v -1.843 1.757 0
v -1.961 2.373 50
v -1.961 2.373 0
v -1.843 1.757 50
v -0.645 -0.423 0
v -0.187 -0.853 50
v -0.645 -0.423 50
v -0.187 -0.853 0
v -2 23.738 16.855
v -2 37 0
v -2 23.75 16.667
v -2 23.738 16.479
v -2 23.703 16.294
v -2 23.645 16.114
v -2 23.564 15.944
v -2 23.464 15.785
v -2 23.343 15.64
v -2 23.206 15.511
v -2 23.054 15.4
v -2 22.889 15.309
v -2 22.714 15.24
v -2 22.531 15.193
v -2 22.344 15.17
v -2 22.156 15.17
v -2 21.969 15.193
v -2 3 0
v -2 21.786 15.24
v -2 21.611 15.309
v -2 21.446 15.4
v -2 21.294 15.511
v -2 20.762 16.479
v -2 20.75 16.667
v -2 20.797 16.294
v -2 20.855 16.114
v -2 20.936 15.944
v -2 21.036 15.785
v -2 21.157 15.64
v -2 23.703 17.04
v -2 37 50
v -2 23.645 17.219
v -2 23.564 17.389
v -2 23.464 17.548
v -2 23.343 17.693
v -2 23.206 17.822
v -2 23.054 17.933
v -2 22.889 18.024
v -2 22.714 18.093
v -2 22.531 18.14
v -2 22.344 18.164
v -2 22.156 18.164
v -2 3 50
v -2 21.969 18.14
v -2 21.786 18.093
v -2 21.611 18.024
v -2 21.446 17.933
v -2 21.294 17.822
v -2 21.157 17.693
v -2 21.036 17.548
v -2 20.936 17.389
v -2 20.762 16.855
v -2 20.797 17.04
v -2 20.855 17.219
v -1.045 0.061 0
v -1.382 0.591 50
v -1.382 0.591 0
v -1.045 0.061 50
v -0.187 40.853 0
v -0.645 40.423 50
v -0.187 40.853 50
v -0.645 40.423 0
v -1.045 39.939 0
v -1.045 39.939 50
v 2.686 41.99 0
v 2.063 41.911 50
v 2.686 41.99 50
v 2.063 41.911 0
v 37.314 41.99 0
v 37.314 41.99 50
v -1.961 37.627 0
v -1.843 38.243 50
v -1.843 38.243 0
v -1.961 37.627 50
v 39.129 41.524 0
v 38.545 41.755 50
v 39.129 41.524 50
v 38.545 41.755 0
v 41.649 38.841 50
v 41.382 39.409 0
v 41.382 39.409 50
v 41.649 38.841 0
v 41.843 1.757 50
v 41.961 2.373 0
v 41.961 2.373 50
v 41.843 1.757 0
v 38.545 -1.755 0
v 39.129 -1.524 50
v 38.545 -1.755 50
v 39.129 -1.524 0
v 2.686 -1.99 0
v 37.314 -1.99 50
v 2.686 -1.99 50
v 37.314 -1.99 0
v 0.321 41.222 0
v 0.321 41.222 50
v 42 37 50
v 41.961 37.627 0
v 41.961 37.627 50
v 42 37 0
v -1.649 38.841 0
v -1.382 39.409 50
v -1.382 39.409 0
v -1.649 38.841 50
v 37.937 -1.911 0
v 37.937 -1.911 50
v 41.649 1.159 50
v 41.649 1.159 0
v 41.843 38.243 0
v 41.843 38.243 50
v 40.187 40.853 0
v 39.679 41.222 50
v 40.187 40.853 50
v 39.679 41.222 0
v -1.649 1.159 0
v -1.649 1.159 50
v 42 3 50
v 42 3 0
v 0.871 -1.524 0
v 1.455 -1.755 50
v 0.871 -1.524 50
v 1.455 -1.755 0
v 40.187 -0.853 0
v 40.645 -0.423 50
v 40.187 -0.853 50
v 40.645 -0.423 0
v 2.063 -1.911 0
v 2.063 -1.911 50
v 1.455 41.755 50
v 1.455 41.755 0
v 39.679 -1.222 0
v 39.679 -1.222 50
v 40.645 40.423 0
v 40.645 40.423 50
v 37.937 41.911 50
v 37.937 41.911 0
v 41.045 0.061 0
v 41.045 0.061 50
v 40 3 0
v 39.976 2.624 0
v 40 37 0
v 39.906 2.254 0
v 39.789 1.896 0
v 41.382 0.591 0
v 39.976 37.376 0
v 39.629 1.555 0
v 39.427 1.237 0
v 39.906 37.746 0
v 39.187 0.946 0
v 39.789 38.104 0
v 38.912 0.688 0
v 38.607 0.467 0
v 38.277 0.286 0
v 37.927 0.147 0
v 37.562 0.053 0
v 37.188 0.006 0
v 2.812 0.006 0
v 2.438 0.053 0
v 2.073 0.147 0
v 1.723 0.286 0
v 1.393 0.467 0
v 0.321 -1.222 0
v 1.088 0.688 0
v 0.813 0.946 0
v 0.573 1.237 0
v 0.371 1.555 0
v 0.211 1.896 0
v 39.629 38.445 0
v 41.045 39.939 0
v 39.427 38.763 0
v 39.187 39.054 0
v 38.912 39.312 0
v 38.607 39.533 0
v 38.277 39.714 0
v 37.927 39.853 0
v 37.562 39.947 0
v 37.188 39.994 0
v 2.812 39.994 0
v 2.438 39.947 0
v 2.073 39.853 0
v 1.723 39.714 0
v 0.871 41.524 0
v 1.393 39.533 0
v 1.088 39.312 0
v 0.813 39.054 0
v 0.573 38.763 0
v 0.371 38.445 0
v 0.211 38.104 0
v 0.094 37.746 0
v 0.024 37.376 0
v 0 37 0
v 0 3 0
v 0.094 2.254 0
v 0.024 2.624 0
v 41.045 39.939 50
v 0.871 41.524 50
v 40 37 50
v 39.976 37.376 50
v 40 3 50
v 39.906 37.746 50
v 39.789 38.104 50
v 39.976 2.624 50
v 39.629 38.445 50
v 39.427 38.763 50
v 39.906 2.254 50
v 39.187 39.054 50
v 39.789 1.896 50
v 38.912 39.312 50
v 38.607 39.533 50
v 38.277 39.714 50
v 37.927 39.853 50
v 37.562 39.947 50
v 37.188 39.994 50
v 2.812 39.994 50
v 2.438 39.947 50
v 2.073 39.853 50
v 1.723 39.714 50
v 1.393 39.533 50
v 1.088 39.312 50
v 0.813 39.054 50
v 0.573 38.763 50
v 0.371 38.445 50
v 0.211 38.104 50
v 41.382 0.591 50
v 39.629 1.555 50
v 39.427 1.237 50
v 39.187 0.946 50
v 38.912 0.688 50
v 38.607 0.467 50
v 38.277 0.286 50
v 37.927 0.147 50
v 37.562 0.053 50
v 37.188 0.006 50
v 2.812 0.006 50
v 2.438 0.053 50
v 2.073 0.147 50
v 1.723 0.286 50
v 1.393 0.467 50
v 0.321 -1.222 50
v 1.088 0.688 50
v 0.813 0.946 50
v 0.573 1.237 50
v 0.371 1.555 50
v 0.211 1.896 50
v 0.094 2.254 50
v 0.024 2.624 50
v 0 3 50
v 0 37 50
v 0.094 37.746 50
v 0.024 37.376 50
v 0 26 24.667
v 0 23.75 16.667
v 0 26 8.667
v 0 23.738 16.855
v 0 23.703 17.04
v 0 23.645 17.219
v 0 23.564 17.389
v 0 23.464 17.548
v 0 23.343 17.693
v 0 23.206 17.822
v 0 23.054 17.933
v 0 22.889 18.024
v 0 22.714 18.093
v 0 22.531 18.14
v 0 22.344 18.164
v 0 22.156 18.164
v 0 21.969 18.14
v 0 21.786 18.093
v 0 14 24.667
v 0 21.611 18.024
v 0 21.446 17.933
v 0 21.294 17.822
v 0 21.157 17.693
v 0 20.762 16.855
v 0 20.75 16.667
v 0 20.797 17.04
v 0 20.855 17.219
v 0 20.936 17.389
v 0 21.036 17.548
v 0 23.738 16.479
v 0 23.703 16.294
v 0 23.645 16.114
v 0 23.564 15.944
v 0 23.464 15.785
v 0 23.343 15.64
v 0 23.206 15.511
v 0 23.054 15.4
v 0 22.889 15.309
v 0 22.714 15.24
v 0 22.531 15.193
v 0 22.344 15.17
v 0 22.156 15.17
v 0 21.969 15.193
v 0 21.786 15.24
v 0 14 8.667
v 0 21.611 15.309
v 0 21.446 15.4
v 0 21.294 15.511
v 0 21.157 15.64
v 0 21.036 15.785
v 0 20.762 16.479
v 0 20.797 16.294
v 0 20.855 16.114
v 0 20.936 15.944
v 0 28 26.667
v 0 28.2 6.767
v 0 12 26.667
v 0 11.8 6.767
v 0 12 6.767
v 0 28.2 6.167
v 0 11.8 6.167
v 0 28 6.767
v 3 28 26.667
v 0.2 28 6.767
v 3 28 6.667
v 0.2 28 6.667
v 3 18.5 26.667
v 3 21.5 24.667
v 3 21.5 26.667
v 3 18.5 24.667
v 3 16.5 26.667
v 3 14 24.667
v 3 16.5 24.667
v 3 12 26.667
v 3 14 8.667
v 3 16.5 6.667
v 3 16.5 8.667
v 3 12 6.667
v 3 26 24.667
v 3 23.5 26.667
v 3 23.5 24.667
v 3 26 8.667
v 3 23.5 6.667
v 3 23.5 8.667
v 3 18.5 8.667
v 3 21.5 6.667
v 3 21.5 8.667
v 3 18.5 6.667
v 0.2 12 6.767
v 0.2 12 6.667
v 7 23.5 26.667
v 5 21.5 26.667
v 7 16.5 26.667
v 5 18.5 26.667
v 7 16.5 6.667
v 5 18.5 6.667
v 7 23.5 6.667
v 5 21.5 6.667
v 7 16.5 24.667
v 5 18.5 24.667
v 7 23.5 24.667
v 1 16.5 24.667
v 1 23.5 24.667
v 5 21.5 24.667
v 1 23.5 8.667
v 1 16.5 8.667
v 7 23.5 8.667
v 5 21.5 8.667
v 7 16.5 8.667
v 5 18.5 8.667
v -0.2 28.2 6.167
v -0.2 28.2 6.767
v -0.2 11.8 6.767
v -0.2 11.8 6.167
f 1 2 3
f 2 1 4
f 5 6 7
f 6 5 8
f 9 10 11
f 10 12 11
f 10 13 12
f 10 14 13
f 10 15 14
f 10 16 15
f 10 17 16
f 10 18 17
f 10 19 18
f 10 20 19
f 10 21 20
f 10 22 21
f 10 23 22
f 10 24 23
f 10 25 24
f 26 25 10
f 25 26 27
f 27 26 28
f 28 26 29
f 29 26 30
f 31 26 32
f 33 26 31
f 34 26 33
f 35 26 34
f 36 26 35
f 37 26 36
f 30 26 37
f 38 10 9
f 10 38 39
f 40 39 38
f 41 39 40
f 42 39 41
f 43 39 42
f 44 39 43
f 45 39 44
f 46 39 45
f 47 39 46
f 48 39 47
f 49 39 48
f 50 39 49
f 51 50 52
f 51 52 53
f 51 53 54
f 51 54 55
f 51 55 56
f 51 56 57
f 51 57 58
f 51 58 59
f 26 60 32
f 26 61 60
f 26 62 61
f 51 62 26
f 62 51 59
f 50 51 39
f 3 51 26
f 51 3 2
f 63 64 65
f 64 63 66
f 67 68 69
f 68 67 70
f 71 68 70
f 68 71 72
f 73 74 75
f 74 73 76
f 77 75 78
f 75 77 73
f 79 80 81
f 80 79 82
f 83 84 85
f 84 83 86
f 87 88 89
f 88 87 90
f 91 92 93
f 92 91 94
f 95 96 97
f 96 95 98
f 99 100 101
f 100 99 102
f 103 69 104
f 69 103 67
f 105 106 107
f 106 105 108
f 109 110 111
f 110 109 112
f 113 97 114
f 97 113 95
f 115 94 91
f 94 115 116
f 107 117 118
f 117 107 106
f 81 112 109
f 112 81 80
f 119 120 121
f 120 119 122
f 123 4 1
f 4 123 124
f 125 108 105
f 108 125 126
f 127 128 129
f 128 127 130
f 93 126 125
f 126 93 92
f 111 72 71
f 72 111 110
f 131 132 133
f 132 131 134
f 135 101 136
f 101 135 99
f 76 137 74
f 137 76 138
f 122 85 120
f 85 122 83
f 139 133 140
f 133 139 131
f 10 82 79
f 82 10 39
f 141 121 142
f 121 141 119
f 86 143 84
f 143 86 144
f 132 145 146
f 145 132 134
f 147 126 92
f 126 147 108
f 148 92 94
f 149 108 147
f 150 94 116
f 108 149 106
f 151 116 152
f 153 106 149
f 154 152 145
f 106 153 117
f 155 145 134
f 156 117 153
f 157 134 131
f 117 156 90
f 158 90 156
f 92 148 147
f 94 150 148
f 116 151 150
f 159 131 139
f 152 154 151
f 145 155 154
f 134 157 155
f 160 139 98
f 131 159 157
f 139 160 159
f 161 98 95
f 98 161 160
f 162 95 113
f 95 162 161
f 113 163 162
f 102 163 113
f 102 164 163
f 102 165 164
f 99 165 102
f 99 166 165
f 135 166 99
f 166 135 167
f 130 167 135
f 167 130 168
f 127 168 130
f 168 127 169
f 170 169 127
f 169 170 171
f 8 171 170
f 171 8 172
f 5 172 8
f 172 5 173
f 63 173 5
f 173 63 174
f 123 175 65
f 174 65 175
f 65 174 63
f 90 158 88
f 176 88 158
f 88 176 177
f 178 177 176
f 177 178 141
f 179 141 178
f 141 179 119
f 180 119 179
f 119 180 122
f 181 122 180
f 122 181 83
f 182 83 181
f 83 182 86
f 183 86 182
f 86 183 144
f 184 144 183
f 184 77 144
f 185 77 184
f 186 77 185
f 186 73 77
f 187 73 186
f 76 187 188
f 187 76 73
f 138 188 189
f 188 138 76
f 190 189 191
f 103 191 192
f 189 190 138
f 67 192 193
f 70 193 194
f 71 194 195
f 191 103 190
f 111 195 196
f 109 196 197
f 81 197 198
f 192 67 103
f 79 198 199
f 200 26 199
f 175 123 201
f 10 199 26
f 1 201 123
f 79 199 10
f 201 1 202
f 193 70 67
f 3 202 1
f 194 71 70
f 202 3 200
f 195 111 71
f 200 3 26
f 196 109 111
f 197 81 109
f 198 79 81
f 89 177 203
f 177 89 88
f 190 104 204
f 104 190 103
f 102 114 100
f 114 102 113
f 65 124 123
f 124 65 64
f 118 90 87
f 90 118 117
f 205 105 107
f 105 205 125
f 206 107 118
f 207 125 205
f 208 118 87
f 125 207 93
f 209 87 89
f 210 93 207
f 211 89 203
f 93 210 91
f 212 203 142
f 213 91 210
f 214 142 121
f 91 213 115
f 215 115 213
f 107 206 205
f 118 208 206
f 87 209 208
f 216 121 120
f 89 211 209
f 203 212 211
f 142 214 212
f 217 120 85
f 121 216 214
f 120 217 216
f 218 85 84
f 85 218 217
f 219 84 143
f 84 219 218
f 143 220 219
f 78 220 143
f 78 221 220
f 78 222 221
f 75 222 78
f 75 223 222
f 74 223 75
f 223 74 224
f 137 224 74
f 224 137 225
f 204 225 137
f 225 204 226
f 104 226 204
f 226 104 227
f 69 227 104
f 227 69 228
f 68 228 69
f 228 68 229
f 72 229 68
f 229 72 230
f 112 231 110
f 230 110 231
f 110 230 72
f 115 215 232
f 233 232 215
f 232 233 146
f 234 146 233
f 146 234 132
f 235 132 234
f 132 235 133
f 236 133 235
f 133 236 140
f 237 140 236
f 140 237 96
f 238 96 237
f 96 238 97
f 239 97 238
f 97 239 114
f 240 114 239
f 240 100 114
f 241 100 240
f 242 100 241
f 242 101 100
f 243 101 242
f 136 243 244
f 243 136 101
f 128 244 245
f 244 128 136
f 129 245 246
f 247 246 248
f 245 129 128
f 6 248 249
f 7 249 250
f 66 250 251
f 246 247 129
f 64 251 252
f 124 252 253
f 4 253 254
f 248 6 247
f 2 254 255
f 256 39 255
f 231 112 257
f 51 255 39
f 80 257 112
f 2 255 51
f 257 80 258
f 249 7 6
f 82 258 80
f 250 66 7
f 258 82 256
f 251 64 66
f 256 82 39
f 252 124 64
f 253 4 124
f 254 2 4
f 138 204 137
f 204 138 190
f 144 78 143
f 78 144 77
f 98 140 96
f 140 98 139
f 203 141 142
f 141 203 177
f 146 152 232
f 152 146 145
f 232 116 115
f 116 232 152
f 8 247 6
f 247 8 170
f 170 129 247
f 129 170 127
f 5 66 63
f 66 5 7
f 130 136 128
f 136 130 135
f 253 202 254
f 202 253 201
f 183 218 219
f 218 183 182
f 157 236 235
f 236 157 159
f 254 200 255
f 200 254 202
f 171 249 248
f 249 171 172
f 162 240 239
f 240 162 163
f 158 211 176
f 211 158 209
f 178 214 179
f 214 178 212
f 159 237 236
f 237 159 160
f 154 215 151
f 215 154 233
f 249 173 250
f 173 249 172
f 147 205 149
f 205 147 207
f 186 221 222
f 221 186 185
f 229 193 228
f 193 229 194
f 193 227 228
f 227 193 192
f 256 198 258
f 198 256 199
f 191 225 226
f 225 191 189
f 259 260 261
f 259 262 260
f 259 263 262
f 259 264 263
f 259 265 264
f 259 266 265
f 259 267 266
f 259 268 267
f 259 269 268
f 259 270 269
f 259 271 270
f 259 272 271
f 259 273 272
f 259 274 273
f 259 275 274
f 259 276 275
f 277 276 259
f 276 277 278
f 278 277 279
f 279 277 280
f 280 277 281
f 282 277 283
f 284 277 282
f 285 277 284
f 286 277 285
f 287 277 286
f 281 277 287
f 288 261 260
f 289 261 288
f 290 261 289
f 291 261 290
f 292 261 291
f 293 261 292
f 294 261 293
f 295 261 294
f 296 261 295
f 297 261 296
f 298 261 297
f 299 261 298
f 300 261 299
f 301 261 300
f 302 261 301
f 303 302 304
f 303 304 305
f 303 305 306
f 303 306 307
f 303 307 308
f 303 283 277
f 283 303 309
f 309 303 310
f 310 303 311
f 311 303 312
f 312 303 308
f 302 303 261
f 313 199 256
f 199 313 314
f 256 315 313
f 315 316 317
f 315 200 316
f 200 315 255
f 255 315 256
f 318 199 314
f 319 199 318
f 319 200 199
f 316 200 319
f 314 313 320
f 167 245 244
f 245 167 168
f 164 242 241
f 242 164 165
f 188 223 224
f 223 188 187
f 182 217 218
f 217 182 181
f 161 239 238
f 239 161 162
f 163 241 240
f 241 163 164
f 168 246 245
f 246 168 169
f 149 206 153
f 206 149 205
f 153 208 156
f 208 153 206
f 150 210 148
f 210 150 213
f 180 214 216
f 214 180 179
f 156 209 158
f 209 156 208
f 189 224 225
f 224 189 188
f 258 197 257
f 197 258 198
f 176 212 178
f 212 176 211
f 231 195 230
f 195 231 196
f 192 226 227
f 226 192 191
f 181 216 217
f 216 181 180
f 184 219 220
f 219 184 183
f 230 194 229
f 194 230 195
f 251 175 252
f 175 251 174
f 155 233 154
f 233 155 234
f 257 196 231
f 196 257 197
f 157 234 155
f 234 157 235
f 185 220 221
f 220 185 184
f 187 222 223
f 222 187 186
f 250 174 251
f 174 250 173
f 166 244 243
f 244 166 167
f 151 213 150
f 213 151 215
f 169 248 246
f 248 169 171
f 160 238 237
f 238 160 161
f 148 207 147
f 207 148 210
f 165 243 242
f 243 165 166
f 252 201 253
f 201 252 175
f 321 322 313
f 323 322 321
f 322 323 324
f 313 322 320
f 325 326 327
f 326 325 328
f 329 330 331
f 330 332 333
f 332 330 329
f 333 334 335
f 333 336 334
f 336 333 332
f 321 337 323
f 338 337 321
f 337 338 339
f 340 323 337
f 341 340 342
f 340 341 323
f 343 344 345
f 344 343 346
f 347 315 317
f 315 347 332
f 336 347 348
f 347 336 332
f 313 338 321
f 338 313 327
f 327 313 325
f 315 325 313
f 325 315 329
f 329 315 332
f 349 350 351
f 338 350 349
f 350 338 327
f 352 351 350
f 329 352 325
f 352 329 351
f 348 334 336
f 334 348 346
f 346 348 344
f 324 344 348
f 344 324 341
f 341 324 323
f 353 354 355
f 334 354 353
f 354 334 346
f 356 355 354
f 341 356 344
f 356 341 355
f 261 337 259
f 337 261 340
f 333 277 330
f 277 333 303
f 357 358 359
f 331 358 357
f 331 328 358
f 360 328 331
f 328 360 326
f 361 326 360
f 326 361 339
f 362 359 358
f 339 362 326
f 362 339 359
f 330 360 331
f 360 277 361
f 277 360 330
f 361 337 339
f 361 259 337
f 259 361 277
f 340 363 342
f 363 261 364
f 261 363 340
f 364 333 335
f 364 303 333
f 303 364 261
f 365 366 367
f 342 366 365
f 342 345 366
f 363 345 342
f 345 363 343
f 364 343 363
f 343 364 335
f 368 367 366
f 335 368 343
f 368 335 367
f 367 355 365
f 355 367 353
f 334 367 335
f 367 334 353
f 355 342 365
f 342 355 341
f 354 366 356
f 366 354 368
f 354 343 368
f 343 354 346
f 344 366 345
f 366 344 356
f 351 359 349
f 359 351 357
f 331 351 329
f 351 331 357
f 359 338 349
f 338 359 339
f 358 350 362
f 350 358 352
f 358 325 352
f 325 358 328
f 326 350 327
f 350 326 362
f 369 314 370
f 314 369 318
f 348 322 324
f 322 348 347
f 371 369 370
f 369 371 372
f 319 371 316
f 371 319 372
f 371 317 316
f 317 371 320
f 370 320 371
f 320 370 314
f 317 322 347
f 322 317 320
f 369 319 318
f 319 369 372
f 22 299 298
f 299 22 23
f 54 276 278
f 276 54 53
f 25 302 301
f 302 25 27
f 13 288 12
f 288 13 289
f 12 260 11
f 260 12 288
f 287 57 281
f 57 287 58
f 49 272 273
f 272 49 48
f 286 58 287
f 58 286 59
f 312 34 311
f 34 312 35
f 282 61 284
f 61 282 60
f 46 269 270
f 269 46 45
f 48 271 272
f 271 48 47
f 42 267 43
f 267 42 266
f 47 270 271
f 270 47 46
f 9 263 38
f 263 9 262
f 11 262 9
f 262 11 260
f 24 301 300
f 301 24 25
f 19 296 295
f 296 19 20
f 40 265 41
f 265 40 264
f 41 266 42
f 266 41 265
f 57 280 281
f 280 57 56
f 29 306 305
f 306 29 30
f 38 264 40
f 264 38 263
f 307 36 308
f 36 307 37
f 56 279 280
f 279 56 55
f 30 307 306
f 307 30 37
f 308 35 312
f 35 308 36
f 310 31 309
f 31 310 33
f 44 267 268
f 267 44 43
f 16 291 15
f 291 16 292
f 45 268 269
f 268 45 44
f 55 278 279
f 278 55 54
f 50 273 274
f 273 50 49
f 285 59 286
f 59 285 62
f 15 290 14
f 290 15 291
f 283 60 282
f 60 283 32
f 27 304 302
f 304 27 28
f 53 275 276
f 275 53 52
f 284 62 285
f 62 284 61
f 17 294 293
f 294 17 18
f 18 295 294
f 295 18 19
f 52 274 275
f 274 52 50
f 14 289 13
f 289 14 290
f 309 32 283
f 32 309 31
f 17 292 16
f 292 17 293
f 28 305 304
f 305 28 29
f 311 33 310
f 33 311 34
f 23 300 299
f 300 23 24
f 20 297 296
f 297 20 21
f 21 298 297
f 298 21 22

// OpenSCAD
// file: ../src/components.scad
tiny = 0.01; // Value to add hole depths to fully clear OpenSCAD preview.

module doppler_motion_sensor() {
    translate([0, 0, 0]) tap_post(6, 1.4);
    translate([15, 0, 0]) tap_post(6, 1.4);
    translate([0, 15, 0]) tap_post(6, 1.4);
    translate([15, 15, 0]) tap_post(6, 1.4);
}

module round_buzzer(buzzer_d, hole_d) {
    difference() {
        linear_extrude(2) circle((buzzer_d+2)/2.0);
        translate([0,0,-tiny]) linear_extrude(2+2*tiny) circle(buzzer_d/2.0);
    }
}

module round_buzzer_hole(hole_d) {
    hole(hole_d/2.0);
}

// Works best if r is evenly divisible by hole_w
module circular_speaker_grid_holes(r, h=wall, hole_w=2) {
    tiny = 0.01;
    translate([0, 0, -(h/2)-tiny]) intersection() {
        union() {
            for (y = [-(r-hole_w):2*hole_w:r-hole_w]) {
                translate([0, y, 0]) cube([r*2, hole_w, h+2*tiny], center=true);
            }
        }
        cylinder(r=r, h=h+2*tiny, center=true);
    }
}

module bme280() {
    translate([0, 0, 3/2]) difference() {
        cube([12+4, 16+4, 3], center=true);
        cube([12, 16, 3+2*tiny], center=true);
    }
    translate([3.5, -8-2, 1]) rotate([0, 0, 90]) wire_tie_loop();
    translate([3.5, 8, 1]) rotate([0, 0, 90]) wire_tie_loop();
}

module bme280_marker() {
    small = 0.2;
    translate([0, -(((16+4)/2)+small), 0])
        cube([12+4+2*small, small*3, small*2], center=true);
}

module bme280_hole() {
    translate([(11.5/2)-3.5, 0, -tiny]) hole(3/2);
}

module max9814_mic(rot=0) {
    rotate([0, 0, rot])
        union() {
            difference() {
                translate([-7.5-2, -7.5-2, 0]) cube([15.5+4, 26.5+4, 6]);
                translate([-7.5, -7.5, -tiny]) cube([15.5, 26.5, 6+2*tiny]);
            }
            translate([-7.5-2, -7.5-2, 0]) cube([15.5+4, 26.5, 3]);
            translate([8, 5, 4]) rotate([0, 0, 0]) wire_tie_loop();
            translate([-9.5, 5, 4]) rotate([0, 0, 0]) wire_tie_loop();
        }
}

module max9814_mic_hole() {
    translate([0, 0, 6-tiny]) hole(5, wall+6);
}

module wire_tie_loop() {
    translate([1,3.5,3]) difference() {
        cube([2, 7, 6], center=true);
        cube([2+2*tiny, 3, 2], center=true);
    }
}
// file: ../src/utils.scad
module tap_post(h, size, post_wall=2) {
    inner_d = size*0.8; //Possibly snug, but with PLA I prefer that
    outer_d = post_wall*2+size;
    difference() {
        linear_extrude(h) circle(outer_d/2.0);
        translate([0, 0, -1]) linear_extrude(h+2) circle(inner_d/2.0); 
    }
}

module heat_insert_post(h, size, post_wall=2) {
    inner_d = size;
    outer_d = post_wall*2+size;
    inset_r = (size+2+0.15)/2.0;
    chamfer_h = sin(8)*inset_r;
    difference() {
        linear_extrude(h) circle(outer_d/2.0);
        translate([0, 0, -1]) linear_extrude(h+2) circle(inner_d/2.0);
        translate([0, 0, -1]) cylinder(h=h+2, r1=inset_r, r2=inset_r-cos(8)*inset_r); 
    }
}

module horizontal_slot_hole(sw, sh) {
    translate([-(sw-sh)/2.0, 0, 0]) hole(sh/2.0, wall);
    centered_rect_hole(sw-sh, sh, wall);
    translate([(sw-sh)/2.0, 0, 0]) hole(sh/2.0, wall);
}

module tapered_bolt_hole(r, h) {
    rotate([180, 0, 0]) translate([0, 0, -1]) union() {
        bolt_top_r = r*2;
        chamfer_h = sin(45)*bolt_top_r;
        h_chamfered = chamfer_h>h?h:chamfer_h;
        h_remaining = chamfer_h>h?0:h-chamfer_h;
        cylinder(h=1, r=bolt_top_r);
        translate([0, 0, 1])
            cylinder(h=h_chamfered, r1=bolt_top_r, r2=r);
        translate([0, 0, h_chamfered])
            cylinder(h=h_remaining+2, r=r*0.80);
    }
}

module hole(r, h=wall) {
        rotate([180, 0, 0]) translate([0, 0, -1]) linear_extrude(h+2) circle(r);
}

module centered_rect_hole(w, d, h) {
    rotate([180, 0, 0]) translate([0, 0, -1]) linear_extrude(h+2) square([w,d], center=true);
}

module round_rect(dim, radius) {
    hull() {
        translate([radius, radius, 0]) circle(radius);
        translate([dim.x-radius, radius, 0]) circle(radius);
        translate([radius, dim.y-radius, 0]) circle(radius);
        translate([dim.x-radius, dim.y-radius, 0]) circle(radius);
    }
}

module left(x, y) {
    translate([0, x, y]) rotate([-90, 180, -90]) children();
}

module right(x, y) {
    translate([w, d-x, y]) rotate([-90, 180, 90]) children();
}

module front(x, y) {
    translate([w-x, 0, y]) rotate([90, 0, 180]) children();
}

module back(x, y) {
    translate([x, d, y]) rotate([90, 0, 0]) children();
}

module bottom(x, y) {
    translate([x, y, 0]) children();
}
// file: ../src/simple_box.scad
/* You must define these in your project file.
$fn = 50;
w = 100; // Inner box width (X)
d = 70; // Inner box depth (Y)
h = 40; // Inner box height (Z)

// Wall should be at least 2 or it may not print well.
wall = 2; // Box/lid wall thickness
// Fillet must be greater than or equal to 2*wall.
fillet = 7; // Fillet radius of xy plane fillet

lid_inset = 0.5; // So lid is not such a tight fit.
lid_hole_size = 3; // M3 bolt.
 */
 
//include <../src/utils.scad>; // For debugging
//simple_box_lid(); // For debugging

module simple_box() {
    _make_simple_box_bottom();
    translate([0, 0, wall]) simple_box_body();
}

module _make_simple_box_bottom() {
	translate([-wall, -wall, -wall]) 
        linear_extrude(wall)
			round_rect([w+2*wall,d+2*wall], fillet);
}

module simple_box_bottom() {
    _make_simple_box_bottom();
    difference() {
        translate([lid_inset, lid_inset, 0])
            linear_extrude(2*wall+2)
                round_rect([w-2*lid_inset,d-2*lid_inset], fillet-wall-lid_inset);
        translate([wall+lid_inset, wall+lid_inset, -1])
            linear_extrude(2*wall+4)
                round_rect([w-2*wall-2*lid_inset,d-2*wall-2*lid_inset], fillet-2*wall-lid_inset);
    }
}

module simple_box_body(add_posts=false) {
    difference() {
        translate([-wall, -wall, 0])
            linear_extrude(h)
                round_rect([w+2*wall,d+2*wall], fillet);
        translate([0, 0, -1])
            linear_extrude(h+2)
                round_rect([w,d], fillet-wall);
    }
    if (add_posts) {
        post_ctr = fillet-2;
        // 2 is default post wall size, but we use 4 below to anchor solidly
        translate([post_ctr, post_ctr, h-8])
            tap_post(8, lid_hole_size, 4);
        translate([post_ctr, d-post_ctr, h-8])
            tap_post(8, lid_hole_size, 4);
        translate([w-post_ctr, post_ctr, h-8])
            tap_post(8, lid_hole_size, 4);
        translate([w-post_ctr, d-post_ctr, h-8])
            tap_post(8, lid_hole_size, 4);
    }
}

module simple_box_posts(h=8, sz=lid_hole_size, heat_insert=false) {
    p_wall = fillet-2-(sz/2);
    p_r = fillet-2;
    p_d = p_r*2;
    sep_thickness = 0.5;
    sep_len = p_d;
    for (x= [0, p_d+sep_len]) {
        for(y= [0, p_d+sep_len]) {
            if (!heat_insert) {
                translate([x,y,0]) tap_post(h, sz, p_wall);
            } else {
                translate([x,y,0]) heat_insert_post(h, sz, p_wall);
            }
            translate([x+p_r-2,y-1,0]) cube([sep_len+4, 2, 0.5]);
            translate([x-1,y+p_r-2,0]) cube([2, sep_len+4, 0.5]);
        }
    }
}

module simple_box_lid() {
    post_ctr = fillet-2;
    difference() {
        translate([0, 0, wall]) _make_simple_box_bottom();
        translate([post_ctr, post_ctr, 0])
            rotate([180, 0, 0]) 
                tapered_bolt_hole((lid_hole_size/2.0), 8);
        translate([post_ctr, d-post_ctr, 0])
            rotate([180, 0, 0]) 
                tapered_bolt_hole((lid_hole_size/2.0), 8);
        translate([w-post_ctr, post_ctr, 0])
            rotate([180, 0, 0]) 
                tapered_bolt_hole((lid_hole_size/2.0), 8);
        translate([w-post_ctr, d-post_ctr, 0])
            rotate([180, 0, 0]) 
                tapered_bolt_hole((lid_hole_size/2.0), 8);
    }
}
// main file
$fn = 50;
w = 40; // Inner box width (X)
d = 40; // Inner box depth (Y)
h = 50; // Inner box height (Z)

// Wall should be at least 2 or it may not print well.
wall = 2; // Box/lid wall thickness
// Fillet must be greater than or equal to 2*wall.
fillet = 5; // Fillet radius of xy plane fillet

lid_inset = 0.3; // So lid is not such a tight fit.
lid_hole_size = 3; // M3 bolt.

include <../src/simple_box.scad>;
include <../src/utils.scad>;
include <../src/components.scad>;

spk_hole_spacing = 41;
module speaker() {
    translate([0, 0, 0]) tap_post(6, 3);
    translate([spk_hole_spacing, 0, 0]) tap_post(6, 3);
    translate([0, spk_hole_spacing, 0]) tap_post(6, 3);
    translate([spk_hole_spacing, spk_hole_spacing, 0]) tap_post(6, 3);
}
module speaker_holes() {
    ctr = spk_hole_spacing/2;
    translate([ctr, ctr, 0.01])
        circular_speaker_grid_holes(20, 3);
}

module make_body() {
    difference() {
        union() {
            simple_box_body();
            left(d/2, 1*(h/3)) bme280();
        }
        //right(d/2, 15) horizontal_slot_hole(12, 7); // Slot for micro-usb
        left(d/2, 1*(h/3)) bme280_marker();
        left(d/2, 1*(h/3)) bme280_hole();
    }
}


module make_bottom() {
        spk_off = (d-spk_hole_spacing)/2;
    difference() {
        union() {
            simple_box_bottom();
            bottom(spk_off+8, spk_off) speaker();
            bottom(w-28, d/3) max9814_mic(rot=90);
        }
        bottom(spk_off+8, spk_off) speaker_holes();
        bottom(w-28, 2*(d/3)) hole(6); // 12mm d pushbutton
        bottom(w-28, d/3) max9814_mic_hole();
    }
}

module make_lid() {
    difference() {
        union() {
            simple_box_lid();
        }
    }
}

MODEL="body";
if (MODEL == "body") {
    make_body();
} else if (MODEL == "lid") {
    make_lid();
} else if (MODEL == "bottom") {
    make_bottom();
} else {
    make_body();
    translate([-10, d, 0]) rotate ([0, 0, 90])
        make_lid();
    translate([-d-10, 0, 0]) rotate ([0, 0, -90])
        make_bottom();
}
